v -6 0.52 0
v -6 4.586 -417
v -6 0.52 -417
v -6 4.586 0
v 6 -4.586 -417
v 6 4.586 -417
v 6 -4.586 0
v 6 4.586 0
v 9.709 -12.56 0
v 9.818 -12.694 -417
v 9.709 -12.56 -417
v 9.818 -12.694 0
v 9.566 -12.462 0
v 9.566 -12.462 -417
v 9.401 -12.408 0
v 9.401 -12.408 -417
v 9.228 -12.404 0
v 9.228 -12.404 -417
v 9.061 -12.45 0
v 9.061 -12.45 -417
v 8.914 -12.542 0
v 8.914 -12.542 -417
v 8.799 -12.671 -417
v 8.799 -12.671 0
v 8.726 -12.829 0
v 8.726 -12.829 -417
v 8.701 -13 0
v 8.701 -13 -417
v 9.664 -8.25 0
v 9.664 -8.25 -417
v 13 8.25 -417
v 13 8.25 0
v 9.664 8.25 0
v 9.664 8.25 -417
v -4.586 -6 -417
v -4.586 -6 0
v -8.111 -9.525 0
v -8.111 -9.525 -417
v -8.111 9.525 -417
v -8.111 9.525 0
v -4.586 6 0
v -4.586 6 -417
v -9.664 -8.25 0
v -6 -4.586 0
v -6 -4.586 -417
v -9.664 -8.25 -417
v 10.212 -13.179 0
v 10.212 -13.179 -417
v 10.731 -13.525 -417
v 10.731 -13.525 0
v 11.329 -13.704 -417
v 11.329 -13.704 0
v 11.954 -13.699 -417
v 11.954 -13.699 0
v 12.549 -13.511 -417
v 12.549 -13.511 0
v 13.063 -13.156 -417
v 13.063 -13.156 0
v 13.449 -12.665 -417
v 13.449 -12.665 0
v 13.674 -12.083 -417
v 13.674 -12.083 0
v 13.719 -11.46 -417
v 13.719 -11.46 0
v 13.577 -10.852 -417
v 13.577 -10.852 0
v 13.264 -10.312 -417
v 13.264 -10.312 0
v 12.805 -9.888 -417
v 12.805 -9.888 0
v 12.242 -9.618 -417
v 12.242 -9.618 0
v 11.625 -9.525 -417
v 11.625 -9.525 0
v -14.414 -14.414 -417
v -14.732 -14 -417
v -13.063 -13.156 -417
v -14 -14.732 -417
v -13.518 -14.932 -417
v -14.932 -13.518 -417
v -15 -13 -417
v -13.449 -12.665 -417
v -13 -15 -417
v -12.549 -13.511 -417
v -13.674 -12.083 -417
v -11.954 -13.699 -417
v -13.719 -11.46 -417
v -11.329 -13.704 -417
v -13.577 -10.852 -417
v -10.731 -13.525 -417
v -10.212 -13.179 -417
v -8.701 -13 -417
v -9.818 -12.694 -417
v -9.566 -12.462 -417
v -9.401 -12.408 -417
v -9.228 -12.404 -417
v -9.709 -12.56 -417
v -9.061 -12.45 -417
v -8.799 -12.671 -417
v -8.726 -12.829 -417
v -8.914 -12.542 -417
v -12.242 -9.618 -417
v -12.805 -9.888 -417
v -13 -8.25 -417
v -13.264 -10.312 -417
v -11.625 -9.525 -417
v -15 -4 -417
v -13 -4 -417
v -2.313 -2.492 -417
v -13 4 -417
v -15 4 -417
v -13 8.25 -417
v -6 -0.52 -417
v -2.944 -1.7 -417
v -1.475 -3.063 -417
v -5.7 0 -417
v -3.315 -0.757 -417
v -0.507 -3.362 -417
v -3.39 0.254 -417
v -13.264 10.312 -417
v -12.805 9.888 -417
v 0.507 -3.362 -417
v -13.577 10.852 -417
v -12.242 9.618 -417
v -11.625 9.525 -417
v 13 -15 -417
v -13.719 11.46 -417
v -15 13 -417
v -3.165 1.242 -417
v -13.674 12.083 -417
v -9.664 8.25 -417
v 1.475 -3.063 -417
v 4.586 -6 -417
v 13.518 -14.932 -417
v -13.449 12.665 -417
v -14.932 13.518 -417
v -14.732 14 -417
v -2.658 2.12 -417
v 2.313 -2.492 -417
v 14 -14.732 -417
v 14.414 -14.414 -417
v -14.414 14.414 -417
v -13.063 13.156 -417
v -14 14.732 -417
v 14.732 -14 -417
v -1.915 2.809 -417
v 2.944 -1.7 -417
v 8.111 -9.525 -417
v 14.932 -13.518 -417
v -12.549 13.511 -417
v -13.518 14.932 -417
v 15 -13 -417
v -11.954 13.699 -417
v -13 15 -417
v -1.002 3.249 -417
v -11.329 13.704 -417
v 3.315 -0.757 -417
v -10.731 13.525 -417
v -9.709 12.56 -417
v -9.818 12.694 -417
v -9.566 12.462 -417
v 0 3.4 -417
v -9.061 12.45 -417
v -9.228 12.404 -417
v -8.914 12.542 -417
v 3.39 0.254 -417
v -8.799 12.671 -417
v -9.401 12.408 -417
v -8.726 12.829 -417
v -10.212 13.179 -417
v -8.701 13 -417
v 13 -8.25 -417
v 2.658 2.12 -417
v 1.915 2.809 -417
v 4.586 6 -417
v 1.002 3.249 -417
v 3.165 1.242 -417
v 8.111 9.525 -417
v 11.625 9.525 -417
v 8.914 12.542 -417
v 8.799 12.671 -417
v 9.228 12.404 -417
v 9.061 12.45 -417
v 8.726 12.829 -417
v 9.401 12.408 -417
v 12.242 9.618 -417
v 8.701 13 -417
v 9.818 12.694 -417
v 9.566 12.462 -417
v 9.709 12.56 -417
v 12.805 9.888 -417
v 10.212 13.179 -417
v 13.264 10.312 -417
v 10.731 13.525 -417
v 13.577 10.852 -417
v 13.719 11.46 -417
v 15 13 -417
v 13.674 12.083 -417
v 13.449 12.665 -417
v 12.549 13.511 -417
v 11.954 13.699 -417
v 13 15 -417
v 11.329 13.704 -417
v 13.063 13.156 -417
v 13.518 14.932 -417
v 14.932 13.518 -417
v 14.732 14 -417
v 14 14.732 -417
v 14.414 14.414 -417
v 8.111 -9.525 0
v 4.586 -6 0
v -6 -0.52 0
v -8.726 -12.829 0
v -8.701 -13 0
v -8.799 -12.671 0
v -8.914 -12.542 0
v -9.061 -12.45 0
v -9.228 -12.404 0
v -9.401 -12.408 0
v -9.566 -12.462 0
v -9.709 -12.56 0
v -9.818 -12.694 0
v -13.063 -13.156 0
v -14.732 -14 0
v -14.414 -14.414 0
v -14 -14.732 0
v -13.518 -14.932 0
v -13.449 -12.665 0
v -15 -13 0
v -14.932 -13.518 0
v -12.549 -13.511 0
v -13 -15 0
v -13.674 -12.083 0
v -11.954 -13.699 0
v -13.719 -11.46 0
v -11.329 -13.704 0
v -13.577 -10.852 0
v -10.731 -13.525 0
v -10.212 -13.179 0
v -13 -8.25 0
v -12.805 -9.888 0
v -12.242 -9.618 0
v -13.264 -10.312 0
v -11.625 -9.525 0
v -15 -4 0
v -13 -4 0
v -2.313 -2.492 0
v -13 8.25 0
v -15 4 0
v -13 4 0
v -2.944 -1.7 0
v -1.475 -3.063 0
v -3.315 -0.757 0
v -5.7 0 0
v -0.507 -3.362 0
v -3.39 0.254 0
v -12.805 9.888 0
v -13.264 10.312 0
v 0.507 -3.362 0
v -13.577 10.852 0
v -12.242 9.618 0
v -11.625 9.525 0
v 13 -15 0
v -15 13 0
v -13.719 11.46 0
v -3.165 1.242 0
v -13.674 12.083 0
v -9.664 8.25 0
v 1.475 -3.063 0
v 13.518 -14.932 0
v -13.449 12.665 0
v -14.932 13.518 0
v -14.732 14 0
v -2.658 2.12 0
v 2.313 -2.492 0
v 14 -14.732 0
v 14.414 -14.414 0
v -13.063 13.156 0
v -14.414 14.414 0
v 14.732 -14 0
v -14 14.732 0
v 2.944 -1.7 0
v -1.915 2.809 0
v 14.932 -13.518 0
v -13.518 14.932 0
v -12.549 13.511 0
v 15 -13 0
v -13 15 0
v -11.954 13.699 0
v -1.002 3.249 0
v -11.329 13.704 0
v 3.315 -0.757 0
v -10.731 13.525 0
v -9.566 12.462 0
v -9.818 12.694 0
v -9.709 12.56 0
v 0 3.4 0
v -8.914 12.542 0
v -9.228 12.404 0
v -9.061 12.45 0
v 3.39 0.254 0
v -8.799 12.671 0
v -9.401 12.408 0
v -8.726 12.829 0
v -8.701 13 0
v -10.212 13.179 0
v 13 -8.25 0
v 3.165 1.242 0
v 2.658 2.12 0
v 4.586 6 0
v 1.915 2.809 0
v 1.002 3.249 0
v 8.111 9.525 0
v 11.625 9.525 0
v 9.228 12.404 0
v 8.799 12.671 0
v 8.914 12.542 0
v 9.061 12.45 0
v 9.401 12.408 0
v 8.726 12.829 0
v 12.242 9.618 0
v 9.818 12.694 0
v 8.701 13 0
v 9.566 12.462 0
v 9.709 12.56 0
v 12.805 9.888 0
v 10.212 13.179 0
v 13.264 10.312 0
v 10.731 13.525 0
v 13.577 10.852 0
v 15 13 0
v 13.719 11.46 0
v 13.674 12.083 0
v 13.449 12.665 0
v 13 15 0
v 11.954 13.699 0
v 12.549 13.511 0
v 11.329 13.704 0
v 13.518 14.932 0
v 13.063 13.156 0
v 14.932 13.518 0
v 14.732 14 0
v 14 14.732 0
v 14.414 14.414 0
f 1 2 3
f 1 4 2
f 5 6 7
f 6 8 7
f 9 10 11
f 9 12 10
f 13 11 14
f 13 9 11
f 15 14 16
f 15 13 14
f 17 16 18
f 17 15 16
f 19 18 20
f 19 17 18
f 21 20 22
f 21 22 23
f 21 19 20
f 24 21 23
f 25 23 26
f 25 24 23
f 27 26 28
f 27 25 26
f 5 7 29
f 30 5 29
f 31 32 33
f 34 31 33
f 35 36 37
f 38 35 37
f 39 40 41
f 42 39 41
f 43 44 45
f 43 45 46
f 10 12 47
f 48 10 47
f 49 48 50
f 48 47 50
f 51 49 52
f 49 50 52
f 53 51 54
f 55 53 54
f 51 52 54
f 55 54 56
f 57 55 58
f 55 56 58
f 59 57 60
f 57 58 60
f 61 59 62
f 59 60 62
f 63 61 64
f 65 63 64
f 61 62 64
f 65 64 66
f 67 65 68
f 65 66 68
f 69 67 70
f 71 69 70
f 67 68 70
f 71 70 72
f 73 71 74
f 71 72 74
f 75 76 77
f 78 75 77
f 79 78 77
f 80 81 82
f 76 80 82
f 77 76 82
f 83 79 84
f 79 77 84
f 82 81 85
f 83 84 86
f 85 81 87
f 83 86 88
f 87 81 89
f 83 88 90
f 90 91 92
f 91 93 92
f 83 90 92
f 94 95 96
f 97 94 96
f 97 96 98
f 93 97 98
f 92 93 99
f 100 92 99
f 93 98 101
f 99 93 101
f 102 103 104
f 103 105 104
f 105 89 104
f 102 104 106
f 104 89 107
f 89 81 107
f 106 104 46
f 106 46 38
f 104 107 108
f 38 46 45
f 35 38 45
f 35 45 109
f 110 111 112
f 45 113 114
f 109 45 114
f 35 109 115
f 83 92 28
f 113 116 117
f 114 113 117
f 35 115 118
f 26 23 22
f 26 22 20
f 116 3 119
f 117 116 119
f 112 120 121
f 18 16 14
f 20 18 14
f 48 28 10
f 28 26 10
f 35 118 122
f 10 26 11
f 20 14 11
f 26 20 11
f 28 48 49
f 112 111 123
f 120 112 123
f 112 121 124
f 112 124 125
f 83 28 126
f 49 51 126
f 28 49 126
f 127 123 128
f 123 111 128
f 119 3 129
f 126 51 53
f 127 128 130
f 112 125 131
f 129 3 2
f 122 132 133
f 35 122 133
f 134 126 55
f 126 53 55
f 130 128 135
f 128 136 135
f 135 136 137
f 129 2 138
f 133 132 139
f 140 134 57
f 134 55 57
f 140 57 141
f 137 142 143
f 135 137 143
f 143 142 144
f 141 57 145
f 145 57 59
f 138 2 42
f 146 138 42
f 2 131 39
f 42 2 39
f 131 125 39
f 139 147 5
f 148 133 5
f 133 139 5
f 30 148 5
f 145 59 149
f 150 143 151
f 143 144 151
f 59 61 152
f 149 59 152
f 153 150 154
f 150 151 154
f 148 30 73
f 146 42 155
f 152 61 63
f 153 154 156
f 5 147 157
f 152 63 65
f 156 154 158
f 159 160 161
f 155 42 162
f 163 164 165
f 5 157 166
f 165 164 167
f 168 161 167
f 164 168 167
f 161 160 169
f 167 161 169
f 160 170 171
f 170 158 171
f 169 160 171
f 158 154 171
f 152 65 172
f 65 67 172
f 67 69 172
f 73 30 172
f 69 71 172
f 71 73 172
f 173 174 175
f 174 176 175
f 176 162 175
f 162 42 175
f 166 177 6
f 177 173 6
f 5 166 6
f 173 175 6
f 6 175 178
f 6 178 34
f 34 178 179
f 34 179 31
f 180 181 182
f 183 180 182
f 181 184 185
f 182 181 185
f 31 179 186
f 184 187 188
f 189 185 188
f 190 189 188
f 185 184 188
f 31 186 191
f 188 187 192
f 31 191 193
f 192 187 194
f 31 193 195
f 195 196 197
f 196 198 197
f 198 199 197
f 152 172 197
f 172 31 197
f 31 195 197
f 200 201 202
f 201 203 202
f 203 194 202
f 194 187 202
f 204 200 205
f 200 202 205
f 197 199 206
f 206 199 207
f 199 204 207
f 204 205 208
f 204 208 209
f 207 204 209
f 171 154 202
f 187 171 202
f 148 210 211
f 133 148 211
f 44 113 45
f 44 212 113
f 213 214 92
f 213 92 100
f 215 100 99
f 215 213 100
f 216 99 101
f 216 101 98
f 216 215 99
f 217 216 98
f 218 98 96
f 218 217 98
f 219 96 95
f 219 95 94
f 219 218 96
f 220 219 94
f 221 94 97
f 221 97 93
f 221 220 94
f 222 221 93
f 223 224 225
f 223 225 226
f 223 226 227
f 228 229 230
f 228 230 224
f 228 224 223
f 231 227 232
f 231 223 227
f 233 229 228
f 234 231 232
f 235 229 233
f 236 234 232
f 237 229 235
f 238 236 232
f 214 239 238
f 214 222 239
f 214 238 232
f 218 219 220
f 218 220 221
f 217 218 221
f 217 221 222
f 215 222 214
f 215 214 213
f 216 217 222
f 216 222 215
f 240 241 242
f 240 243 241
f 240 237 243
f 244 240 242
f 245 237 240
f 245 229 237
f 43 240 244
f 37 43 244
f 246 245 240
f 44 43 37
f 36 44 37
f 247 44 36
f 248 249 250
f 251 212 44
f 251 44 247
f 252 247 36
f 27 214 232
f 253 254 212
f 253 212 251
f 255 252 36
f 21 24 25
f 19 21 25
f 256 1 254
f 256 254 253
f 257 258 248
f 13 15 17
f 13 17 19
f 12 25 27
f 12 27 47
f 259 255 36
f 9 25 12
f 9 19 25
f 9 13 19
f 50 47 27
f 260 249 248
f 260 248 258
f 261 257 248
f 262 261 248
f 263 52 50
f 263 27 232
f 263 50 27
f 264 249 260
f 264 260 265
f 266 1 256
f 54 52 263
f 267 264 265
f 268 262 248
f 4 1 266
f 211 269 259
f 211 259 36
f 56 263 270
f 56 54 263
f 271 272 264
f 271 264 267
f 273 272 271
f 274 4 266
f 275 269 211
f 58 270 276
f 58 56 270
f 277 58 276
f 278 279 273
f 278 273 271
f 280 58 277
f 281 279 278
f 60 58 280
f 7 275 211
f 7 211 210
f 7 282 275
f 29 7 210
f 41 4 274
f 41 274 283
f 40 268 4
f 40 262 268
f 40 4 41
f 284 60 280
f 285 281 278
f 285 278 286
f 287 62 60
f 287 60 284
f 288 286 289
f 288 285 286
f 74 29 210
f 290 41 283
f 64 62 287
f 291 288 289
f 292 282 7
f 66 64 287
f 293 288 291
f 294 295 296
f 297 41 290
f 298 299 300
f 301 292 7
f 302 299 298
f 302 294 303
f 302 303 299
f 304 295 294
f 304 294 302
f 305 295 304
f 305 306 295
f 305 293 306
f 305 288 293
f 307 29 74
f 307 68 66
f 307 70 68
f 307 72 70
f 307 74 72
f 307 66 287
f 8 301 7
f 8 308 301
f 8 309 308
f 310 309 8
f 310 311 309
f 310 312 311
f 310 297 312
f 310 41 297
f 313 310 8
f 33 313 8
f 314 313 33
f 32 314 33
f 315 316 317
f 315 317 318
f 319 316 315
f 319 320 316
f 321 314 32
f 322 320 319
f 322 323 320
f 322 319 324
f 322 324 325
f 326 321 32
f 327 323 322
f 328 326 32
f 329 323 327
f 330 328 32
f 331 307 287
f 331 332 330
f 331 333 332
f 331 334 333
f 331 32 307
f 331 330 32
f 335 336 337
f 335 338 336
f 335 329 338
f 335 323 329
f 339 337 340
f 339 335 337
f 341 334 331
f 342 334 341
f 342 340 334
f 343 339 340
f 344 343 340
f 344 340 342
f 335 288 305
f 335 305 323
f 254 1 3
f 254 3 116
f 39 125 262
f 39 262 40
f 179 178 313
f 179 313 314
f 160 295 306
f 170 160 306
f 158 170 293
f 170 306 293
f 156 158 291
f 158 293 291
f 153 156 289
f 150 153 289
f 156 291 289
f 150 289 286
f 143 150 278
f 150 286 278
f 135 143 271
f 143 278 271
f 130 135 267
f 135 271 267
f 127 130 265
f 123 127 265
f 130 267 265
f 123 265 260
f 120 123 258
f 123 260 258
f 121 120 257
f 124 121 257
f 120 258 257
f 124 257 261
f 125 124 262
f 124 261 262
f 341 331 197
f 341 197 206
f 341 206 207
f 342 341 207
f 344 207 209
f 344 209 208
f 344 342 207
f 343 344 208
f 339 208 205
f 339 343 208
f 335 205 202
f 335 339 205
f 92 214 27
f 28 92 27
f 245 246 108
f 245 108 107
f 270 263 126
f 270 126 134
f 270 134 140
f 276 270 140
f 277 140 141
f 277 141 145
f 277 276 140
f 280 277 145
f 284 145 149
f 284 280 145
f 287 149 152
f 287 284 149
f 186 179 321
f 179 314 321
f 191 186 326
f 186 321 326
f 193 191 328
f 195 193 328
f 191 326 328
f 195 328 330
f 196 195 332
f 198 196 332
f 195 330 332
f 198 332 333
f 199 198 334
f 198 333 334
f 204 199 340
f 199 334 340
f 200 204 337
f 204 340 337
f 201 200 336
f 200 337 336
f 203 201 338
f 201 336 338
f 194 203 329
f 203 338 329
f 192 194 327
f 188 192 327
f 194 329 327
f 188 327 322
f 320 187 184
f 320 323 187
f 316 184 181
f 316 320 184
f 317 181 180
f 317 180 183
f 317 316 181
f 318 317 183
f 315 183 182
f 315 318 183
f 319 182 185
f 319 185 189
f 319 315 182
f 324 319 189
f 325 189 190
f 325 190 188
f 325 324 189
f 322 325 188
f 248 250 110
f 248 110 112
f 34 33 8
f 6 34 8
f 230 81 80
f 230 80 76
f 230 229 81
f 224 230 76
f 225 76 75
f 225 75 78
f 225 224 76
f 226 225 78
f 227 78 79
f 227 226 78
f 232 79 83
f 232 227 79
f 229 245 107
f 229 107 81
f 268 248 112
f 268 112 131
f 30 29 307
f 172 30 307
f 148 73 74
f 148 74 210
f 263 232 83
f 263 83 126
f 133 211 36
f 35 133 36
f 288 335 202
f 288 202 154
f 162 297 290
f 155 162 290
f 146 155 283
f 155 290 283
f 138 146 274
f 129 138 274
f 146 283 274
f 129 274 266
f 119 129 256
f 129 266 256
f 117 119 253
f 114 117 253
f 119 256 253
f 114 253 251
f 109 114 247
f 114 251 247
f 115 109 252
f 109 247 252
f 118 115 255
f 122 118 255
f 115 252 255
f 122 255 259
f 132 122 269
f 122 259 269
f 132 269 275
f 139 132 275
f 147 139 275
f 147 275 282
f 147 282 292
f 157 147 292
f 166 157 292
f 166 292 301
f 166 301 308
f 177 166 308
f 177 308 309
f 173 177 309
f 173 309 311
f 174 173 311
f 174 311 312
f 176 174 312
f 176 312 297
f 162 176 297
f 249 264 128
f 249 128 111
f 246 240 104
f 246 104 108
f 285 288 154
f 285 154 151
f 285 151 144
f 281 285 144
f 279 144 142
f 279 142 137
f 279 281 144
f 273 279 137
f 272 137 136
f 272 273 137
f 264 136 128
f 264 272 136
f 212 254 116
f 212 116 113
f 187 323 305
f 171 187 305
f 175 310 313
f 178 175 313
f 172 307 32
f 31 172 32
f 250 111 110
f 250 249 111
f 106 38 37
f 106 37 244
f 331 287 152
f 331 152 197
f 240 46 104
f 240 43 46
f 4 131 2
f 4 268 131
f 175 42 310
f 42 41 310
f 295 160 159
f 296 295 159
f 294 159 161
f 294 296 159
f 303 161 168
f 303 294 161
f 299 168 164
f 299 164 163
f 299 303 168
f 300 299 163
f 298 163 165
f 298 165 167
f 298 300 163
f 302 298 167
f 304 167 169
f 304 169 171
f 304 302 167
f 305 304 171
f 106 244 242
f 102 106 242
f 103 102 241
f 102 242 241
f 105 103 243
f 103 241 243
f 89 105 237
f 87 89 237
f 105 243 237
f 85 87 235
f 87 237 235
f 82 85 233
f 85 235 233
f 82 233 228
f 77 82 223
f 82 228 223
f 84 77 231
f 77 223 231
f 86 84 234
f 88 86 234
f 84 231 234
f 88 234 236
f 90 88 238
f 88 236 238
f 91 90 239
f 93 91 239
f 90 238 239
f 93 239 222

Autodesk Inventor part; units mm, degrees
sketch "Sketch_122" plane through (0, 0, 0) normal (0, 0, 1) x (1, 0, 0)
  arc A0 (-15, -13) -> (-13, -15) centre (-13, -13) ccw
  line L0 (-13, -15) -> (13, -15)
  arc A1 (13, -15) -> (15, -13) centre (13, -13) ccw
  line L1 (15, -13) -> (15, 13)
  arc A2 (15, 13) -> (13, 15) centre (13, 13) ccw
  line L2 (13, 15) -> (-13, 15)
  arc A3 (-13, 15) -> (-15, 13) centre (-13, 13) ccw
  line L3 (-15, 13) -> (-15, 4)
  line L4 (-15, 4) -> (-13, 4)
  line L5 (-13, 4) -> (-13, 8.25)
  line L6 (-13, 8.25) -> (-9.6642, 8.25)
  line L7 (-9.6642, 8.25) -> (-6, 4.5858)
  line L8 (-6, 4.5858) -> (-6, 0.5196)
  line L9 (-6, 0.5196) -> (-5.7, 0)
  line L10 (-5.7, 0) -> (-6, -0.5196)
  line L11 (-6, -0.5196) -> (-6, -4.5858)
  line L12 (-6, -4.5858) -> (-9.6642, -8.25)
  line L13 (-9.6642, -8.25) -> (-13, -8.25)
  line L14 (-13, -8.25) -> (-13, -4)
  line L15 (-13, -4) -> (-15, -4)
  line L16 (-15, -4) -> (-15, -13)
  line L17 (6, -4.5858) -> (9.6642, -8.25)
  line L18 (9.6642, -8.25) -> (13, -8.25)
  line L19 (13, -8.25) -> (13, 8.25)
  line L20 (13, 8.25) -> (9.6642, 8.25)
  line L21 (9.6642, 8.25) -> (6, 4.5858)
  line L22 (6, 4.5858) -> (6, -4.5858)
extrude "Extrusion1" add sketch "Sketch_122" against normal blind 417
sketch "Sketch2" plane through (0, 0, -417) normal (0, 0, -1) x (-1, 0, 0)
  point P0 (0, 0)
hole "Hole1" at (0, 0, -417) direction (0, 0, 1) diameter 6.8 depth 600
sketch "Sketch_173" plane through (0, 0, 0) normal (0, 0, 1) x (1, 0, 0)
  arc A0 (-9.8177, 12.6944) -> (-11.625, 9.525) centre (-11.625, 11.625) ccw
  line L0 (-11.625, 9.525) -> (-8.1108, 9.525)
  line L1 (-8.1108, 9.525) -> (-4.5858, 6)
  line L2 (-4.5858, 6) -> (4.5858, 6)
  line L3 (4.5858, 6) -> (8.1108, 9.525)
  line L4 (8.1108, 9.525) -> (11.625, 9.525)
  arc A1 (11.625, 9.525) -> (9.8177, 12.6944) centre (11.625, 11.625) ccw
  arc A2 (8.7013, 13) -> (9.8177, 12.6944) centre (9.3013, 13) ccw
  line L5 (8.7013, 13) -> (-8.7013, 13)
  arc A3 (-9.8177, 12.6944) -> (-8.7013, 13) centre (-9.3013, 13) ccw
extrude "Extrusion2" cut sketch "Sketch_173" against normal blind 600
sketch "Sketch_174" plane through (0, 0, 0) normal (0, 0, 1) x (1, 0, 0)
  arc A0 (-11.625, -9.525) -> (-9.8177, -12.6944) centre (-11.625, -11.625) ccw
  arc A1 (-8.7013, -13) -> (-9.8177, -12.6944) centre (-9.3013, -13) ccw
  line L0 (-8.7013, -13) -> (8.7013, -13)
  arc A2 (9.8177, -12.6944) -> (8.7013, -13) centre (9.3013, -13) ccw
  arc A3 (9.8177, -12.6944) -> (11.625, -9.525) centre (11.625, -11.625) ccw
  line L1 (11.625, -9.525) -> (8.1108, -9.525)
  line L2 (8.1108, -9.525) -> (4.5858, -6)
  line L3 (4.5858, -6) -> (-4.5858, -6)
  line L4 (-4.5858, -6) -> (-8.1108, -9.525)
  line L5 (-8.1108, -9.525) -> (-11.625, -9.525)
extrude "Extrusion3" cut sketch "Sketch_174" against normal blind 600
ref_plane "C1_XY" through (0, 0, 0) normal (0, 0, 1) x (1, 0, 0)
ref_plane "C1_YZ" through (0, 0, 0) normal (1, 0, 0) x (0, 1, 0)
ref_plane "C1_ZX" through (0, 0, 0) normal (0, 1, 0) x (0, 0, 1)
ref_plane "to_frame_cap1_XY" through (0, 0, 0) normal (0, 0, 1) x (1, 0, 0)
ref_plane "to_frame_cap1_YZ" through (0, 0, 0) normal (1, 0, 0) x (0, 1, 0)
ref_plane "to_frame_cap1_ZX" through (0, 0, 0) normal (0, 1, 0) x (0, 0, 1)
ref_plane "to_frame_cap2_XY" through (0, 0, -600) normal (0, 0, -1) x (1, 0, 0)
ref_plane "to_frame_cap2_YZ" through (0, 0, -600) normal (1, 0, 0) x (0, -1, 0)
ref_plane "to_frame_cap2_ZX" through (0, 0, -600) normal (0, -1, 0) x (0, 0, -1)
thread "Thread1" size "M8x1.25" class "6H" standard "ANSI Metric M Profile" length 10
thread "Thread2" size "M7x1" class "6H" standard "ANSI Metric M Profile" length 10
properties part number "HFSC6-3030-417" material "Aluminum 6061"
